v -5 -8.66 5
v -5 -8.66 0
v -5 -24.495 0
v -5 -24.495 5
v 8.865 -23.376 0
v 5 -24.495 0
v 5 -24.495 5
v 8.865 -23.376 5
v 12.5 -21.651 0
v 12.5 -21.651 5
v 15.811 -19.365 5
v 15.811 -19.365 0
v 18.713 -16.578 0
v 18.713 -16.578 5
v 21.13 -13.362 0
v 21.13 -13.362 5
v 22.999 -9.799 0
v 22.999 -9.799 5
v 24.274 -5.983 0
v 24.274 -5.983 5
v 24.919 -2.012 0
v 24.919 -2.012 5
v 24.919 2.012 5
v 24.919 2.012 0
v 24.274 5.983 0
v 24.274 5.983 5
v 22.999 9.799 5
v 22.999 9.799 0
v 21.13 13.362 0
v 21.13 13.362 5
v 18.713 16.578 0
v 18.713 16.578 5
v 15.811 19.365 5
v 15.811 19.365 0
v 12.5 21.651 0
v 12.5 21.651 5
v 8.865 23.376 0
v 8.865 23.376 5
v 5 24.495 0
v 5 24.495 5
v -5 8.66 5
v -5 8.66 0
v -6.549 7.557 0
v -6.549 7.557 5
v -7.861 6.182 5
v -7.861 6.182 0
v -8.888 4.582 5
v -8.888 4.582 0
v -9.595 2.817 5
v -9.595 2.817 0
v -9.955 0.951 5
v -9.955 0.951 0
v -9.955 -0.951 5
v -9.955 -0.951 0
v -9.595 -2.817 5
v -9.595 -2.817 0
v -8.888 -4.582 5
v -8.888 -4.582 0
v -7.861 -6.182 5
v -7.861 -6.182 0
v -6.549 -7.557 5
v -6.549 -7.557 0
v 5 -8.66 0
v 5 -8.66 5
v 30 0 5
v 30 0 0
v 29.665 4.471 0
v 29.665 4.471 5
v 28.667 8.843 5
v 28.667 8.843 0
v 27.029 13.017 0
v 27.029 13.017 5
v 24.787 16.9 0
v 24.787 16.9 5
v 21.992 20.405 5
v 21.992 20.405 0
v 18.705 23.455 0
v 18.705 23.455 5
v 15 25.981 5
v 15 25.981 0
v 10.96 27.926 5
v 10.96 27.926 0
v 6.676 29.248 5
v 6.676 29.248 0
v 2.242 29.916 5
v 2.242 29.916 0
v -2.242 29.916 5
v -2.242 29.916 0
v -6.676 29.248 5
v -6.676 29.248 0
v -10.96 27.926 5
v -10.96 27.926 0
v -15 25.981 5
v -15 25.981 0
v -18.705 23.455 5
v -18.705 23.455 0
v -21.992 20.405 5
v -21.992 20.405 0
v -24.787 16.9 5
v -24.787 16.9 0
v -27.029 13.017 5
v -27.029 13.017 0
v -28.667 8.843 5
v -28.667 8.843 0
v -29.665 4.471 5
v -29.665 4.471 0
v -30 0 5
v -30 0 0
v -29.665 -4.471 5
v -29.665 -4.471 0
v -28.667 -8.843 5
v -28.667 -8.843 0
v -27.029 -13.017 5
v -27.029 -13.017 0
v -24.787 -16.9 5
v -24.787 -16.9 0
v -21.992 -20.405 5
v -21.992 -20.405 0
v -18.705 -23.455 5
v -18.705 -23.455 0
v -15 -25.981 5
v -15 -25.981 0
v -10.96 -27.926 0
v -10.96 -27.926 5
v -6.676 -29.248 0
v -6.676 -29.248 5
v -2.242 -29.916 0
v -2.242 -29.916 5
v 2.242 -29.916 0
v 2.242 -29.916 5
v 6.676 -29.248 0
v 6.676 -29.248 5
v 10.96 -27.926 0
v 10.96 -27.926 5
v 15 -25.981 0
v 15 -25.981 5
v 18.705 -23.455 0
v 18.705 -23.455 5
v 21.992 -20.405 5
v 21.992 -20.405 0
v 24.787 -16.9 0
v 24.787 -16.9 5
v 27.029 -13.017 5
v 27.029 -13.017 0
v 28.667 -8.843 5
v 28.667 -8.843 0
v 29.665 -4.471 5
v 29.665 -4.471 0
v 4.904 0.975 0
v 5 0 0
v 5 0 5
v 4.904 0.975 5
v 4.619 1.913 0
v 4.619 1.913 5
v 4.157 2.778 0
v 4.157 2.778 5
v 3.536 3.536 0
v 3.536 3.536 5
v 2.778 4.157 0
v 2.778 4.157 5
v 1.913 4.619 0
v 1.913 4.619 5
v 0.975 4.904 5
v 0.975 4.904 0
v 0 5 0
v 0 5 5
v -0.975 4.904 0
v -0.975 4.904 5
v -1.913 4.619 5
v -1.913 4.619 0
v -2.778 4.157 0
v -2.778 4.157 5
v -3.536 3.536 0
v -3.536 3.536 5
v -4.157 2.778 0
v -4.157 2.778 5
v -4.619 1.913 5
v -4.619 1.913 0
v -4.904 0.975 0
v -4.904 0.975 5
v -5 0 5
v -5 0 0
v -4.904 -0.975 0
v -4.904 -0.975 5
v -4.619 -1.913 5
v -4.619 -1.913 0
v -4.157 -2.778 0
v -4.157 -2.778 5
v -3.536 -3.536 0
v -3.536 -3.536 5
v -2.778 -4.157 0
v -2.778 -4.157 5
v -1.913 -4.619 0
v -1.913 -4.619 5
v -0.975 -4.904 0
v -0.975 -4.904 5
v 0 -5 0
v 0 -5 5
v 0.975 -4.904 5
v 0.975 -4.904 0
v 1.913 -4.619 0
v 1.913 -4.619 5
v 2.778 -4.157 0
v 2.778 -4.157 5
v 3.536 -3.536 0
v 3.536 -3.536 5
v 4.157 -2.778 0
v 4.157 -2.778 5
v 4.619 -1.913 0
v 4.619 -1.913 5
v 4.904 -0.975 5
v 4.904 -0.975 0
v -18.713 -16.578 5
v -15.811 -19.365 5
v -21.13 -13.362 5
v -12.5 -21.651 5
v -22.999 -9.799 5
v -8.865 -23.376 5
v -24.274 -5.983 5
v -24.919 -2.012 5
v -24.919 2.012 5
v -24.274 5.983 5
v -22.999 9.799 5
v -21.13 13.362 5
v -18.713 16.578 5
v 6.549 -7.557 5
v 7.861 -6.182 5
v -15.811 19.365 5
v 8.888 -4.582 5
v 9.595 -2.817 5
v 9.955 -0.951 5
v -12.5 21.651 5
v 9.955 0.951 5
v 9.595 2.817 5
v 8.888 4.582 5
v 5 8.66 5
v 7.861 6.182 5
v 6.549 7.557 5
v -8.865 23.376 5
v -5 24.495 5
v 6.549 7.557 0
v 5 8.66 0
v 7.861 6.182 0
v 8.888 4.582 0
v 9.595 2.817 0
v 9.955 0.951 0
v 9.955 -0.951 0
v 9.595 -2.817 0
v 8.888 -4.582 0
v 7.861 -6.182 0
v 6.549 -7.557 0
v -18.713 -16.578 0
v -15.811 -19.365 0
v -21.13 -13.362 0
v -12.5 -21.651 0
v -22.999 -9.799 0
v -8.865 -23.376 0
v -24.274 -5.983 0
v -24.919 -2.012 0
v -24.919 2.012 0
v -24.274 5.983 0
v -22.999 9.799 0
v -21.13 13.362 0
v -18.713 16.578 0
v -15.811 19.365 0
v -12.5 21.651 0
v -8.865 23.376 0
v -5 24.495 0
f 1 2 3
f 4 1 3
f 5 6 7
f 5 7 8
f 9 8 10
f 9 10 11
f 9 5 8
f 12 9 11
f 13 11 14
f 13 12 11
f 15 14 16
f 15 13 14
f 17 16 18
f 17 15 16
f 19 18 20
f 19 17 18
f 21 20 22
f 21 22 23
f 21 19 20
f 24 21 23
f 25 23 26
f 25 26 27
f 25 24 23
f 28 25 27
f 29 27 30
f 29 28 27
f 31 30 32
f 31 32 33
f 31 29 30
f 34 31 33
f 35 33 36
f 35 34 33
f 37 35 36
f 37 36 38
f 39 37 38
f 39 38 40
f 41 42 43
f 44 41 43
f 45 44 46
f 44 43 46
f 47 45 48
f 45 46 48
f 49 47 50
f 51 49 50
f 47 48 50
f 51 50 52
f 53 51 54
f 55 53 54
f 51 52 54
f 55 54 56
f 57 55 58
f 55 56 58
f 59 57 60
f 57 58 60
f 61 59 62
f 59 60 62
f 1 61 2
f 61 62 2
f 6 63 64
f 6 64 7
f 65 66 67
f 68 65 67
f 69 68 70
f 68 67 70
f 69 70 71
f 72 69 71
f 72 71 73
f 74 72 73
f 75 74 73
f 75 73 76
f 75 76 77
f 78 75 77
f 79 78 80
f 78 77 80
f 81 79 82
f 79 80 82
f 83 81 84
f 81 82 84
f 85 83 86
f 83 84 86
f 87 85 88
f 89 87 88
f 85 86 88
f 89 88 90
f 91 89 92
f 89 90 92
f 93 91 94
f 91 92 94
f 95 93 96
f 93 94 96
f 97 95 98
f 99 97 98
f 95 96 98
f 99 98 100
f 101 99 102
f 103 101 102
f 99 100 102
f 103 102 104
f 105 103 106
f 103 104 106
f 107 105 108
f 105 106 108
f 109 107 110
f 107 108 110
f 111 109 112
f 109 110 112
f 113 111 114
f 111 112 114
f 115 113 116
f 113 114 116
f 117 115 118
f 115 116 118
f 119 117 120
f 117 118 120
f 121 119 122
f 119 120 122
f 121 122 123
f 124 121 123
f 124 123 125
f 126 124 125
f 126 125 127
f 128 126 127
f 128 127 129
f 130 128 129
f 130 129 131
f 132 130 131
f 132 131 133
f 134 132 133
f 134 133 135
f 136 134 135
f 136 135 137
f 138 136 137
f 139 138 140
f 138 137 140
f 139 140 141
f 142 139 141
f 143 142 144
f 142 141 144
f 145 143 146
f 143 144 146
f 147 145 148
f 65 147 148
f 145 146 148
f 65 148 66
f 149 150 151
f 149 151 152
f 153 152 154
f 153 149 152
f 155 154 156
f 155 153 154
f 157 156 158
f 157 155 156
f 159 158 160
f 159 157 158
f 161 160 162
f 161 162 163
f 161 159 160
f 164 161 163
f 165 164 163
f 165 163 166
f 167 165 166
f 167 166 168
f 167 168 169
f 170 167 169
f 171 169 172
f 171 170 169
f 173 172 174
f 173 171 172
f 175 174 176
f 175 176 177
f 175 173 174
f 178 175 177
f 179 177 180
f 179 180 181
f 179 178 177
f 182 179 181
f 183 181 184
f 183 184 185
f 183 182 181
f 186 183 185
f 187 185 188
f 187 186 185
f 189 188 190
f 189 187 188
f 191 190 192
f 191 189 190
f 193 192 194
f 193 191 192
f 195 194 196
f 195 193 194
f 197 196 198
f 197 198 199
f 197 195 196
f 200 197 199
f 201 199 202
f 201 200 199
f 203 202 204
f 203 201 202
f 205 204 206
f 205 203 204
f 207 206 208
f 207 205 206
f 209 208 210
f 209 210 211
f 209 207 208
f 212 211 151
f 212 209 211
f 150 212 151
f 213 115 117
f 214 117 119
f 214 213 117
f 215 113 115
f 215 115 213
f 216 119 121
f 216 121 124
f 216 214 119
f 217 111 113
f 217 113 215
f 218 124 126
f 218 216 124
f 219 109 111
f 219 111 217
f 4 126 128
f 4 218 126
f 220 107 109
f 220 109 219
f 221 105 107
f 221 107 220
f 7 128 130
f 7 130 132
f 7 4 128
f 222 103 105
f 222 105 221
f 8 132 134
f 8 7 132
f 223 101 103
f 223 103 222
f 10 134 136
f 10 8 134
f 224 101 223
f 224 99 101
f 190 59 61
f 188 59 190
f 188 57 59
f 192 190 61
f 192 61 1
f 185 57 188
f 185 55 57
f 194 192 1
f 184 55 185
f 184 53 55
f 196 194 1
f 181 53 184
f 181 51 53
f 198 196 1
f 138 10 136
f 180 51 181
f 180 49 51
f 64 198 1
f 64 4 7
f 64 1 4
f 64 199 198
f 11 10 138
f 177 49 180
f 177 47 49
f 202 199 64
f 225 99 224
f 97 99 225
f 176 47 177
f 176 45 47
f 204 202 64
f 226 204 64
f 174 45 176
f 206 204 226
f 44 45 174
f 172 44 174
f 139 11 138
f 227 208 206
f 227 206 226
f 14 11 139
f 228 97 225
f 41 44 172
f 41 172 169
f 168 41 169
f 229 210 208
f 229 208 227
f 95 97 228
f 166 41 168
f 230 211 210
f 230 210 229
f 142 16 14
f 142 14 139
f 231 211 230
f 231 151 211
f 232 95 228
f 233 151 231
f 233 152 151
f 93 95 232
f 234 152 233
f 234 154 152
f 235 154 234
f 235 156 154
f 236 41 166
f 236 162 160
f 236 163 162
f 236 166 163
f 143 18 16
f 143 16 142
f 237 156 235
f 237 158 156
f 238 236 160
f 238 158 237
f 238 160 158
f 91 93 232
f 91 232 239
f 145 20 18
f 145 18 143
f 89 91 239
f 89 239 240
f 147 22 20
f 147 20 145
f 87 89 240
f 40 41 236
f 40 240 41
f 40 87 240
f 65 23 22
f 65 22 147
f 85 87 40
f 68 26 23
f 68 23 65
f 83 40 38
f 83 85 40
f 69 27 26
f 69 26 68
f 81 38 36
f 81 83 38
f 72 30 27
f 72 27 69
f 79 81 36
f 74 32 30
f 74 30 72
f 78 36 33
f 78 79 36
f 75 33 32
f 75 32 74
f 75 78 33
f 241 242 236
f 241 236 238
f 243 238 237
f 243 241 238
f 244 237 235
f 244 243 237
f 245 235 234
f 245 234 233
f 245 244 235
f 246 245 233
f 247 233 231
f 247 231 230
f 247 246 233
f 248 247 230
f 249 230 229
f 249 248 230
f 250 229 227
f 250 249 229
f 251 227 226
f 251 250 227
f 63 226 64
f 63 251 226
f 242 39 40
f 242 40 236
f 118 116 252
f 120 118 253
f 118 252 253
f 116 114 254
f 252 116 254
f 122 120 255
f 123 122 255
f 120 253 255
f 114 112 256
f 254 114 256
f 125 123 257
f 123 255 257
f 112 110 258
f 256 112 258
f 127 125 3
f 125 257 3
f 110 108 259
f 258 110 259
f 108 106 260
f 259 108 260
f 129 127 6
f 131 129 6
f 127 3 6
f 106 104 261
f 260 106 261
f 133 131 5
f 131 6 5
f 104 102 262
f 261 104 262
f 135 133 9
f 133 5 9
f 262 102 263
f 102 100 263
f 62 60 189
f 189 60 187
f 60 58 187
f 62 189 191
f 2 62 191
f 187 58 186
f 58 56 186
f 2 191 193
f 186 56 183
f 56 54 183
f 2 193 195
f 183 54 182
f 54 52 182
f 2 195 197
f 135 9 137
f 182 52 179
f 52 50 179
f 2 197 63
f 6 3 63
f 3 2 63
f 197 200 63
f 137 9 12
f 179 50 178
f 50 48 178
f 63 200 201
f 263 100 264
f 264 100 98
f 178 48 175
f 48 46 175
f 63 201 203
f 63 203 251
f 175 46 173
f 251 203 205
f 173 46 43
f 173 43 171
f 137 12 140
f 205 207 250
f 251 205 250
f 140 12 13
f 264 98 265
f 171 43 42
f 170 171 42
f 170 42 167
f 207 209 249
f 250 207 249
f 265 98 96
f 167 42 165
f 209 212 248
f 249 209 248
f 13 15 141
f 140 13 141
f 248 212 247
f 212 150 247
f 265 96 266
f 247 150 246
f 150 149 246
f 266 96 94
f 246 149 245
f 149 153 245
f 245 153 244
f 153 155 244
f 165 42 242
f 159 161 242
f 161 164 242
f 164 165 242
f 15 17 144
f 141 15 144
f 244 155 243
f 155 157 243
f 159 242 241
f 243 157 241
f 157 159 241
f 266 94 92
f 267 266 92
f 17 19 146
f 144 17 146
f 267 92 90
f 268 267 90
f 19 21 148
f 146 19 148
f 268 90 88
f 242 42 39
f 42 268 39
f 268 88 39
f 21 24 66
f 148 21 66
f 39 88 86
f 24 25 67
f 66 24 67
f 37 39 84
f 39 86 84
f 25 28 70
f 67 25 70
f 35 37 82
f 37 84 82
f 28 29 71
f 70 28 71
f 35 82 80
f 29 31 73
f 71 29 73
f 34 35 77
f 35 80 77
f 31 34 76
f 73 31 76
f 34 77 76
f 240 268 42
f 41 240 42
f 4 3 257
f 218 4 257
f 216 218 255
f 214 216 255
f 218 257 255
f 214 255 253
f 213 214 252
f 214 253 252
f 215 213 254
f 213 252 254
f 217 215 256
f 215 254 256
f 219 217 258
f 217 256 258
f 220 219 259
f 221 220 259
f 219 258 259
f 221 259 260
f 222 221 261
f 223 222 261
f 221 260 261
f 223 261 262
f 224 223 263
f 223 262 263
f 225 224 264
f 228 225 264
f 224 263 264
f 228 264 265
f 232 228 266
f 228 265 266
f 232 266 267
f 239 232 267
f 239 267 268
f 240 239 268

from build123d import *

# Parameters (mm, degrees)
SKETCH1_R           = 30
SKETCH1_R_2         = 5
BOSS_EXTRUDE1_DEPTH = 5


with BuildPart() as part:
    # Sketch1 → Boss-Extrude1 (new body)
    with BuildSketch(Plane.XY):
        Circle(SKETCH1_R)
        Circle(SKETCH1_R_2, mode=Mode.SUBTRACT)
        with BuildLine():
            Line((-5, 24.494897428), (-5, 8.660254038))
            ThreePointArc((-5, 8.660254038), (-10, 0), (-5, -8.660254038))
            Line((-5, -8.660254038), (-5, -24.494897428))
            ThreePointArc((-5, -24.494897428), (-25, 0), (-5, 24.494897428))
        make_face(mode=Mode.SUBTRACT)
        with BuildLine():
            Line((5, 24.494897428), (5, 8.660254038))
            ThreePointArc((5, 8.660254038), (10, 0), (5, -8.660254038))
            Line((5, -8.660254038), (5, -24.494897428))
            ThreePointArc((5, -24.494897428), (25, 0), (5, 24.494897428))
        make_face(mode=Mode.SUBTRACT)
    extrude(amount=BOSS_EXTRUDE1_DEPTH)


solid = part.part
